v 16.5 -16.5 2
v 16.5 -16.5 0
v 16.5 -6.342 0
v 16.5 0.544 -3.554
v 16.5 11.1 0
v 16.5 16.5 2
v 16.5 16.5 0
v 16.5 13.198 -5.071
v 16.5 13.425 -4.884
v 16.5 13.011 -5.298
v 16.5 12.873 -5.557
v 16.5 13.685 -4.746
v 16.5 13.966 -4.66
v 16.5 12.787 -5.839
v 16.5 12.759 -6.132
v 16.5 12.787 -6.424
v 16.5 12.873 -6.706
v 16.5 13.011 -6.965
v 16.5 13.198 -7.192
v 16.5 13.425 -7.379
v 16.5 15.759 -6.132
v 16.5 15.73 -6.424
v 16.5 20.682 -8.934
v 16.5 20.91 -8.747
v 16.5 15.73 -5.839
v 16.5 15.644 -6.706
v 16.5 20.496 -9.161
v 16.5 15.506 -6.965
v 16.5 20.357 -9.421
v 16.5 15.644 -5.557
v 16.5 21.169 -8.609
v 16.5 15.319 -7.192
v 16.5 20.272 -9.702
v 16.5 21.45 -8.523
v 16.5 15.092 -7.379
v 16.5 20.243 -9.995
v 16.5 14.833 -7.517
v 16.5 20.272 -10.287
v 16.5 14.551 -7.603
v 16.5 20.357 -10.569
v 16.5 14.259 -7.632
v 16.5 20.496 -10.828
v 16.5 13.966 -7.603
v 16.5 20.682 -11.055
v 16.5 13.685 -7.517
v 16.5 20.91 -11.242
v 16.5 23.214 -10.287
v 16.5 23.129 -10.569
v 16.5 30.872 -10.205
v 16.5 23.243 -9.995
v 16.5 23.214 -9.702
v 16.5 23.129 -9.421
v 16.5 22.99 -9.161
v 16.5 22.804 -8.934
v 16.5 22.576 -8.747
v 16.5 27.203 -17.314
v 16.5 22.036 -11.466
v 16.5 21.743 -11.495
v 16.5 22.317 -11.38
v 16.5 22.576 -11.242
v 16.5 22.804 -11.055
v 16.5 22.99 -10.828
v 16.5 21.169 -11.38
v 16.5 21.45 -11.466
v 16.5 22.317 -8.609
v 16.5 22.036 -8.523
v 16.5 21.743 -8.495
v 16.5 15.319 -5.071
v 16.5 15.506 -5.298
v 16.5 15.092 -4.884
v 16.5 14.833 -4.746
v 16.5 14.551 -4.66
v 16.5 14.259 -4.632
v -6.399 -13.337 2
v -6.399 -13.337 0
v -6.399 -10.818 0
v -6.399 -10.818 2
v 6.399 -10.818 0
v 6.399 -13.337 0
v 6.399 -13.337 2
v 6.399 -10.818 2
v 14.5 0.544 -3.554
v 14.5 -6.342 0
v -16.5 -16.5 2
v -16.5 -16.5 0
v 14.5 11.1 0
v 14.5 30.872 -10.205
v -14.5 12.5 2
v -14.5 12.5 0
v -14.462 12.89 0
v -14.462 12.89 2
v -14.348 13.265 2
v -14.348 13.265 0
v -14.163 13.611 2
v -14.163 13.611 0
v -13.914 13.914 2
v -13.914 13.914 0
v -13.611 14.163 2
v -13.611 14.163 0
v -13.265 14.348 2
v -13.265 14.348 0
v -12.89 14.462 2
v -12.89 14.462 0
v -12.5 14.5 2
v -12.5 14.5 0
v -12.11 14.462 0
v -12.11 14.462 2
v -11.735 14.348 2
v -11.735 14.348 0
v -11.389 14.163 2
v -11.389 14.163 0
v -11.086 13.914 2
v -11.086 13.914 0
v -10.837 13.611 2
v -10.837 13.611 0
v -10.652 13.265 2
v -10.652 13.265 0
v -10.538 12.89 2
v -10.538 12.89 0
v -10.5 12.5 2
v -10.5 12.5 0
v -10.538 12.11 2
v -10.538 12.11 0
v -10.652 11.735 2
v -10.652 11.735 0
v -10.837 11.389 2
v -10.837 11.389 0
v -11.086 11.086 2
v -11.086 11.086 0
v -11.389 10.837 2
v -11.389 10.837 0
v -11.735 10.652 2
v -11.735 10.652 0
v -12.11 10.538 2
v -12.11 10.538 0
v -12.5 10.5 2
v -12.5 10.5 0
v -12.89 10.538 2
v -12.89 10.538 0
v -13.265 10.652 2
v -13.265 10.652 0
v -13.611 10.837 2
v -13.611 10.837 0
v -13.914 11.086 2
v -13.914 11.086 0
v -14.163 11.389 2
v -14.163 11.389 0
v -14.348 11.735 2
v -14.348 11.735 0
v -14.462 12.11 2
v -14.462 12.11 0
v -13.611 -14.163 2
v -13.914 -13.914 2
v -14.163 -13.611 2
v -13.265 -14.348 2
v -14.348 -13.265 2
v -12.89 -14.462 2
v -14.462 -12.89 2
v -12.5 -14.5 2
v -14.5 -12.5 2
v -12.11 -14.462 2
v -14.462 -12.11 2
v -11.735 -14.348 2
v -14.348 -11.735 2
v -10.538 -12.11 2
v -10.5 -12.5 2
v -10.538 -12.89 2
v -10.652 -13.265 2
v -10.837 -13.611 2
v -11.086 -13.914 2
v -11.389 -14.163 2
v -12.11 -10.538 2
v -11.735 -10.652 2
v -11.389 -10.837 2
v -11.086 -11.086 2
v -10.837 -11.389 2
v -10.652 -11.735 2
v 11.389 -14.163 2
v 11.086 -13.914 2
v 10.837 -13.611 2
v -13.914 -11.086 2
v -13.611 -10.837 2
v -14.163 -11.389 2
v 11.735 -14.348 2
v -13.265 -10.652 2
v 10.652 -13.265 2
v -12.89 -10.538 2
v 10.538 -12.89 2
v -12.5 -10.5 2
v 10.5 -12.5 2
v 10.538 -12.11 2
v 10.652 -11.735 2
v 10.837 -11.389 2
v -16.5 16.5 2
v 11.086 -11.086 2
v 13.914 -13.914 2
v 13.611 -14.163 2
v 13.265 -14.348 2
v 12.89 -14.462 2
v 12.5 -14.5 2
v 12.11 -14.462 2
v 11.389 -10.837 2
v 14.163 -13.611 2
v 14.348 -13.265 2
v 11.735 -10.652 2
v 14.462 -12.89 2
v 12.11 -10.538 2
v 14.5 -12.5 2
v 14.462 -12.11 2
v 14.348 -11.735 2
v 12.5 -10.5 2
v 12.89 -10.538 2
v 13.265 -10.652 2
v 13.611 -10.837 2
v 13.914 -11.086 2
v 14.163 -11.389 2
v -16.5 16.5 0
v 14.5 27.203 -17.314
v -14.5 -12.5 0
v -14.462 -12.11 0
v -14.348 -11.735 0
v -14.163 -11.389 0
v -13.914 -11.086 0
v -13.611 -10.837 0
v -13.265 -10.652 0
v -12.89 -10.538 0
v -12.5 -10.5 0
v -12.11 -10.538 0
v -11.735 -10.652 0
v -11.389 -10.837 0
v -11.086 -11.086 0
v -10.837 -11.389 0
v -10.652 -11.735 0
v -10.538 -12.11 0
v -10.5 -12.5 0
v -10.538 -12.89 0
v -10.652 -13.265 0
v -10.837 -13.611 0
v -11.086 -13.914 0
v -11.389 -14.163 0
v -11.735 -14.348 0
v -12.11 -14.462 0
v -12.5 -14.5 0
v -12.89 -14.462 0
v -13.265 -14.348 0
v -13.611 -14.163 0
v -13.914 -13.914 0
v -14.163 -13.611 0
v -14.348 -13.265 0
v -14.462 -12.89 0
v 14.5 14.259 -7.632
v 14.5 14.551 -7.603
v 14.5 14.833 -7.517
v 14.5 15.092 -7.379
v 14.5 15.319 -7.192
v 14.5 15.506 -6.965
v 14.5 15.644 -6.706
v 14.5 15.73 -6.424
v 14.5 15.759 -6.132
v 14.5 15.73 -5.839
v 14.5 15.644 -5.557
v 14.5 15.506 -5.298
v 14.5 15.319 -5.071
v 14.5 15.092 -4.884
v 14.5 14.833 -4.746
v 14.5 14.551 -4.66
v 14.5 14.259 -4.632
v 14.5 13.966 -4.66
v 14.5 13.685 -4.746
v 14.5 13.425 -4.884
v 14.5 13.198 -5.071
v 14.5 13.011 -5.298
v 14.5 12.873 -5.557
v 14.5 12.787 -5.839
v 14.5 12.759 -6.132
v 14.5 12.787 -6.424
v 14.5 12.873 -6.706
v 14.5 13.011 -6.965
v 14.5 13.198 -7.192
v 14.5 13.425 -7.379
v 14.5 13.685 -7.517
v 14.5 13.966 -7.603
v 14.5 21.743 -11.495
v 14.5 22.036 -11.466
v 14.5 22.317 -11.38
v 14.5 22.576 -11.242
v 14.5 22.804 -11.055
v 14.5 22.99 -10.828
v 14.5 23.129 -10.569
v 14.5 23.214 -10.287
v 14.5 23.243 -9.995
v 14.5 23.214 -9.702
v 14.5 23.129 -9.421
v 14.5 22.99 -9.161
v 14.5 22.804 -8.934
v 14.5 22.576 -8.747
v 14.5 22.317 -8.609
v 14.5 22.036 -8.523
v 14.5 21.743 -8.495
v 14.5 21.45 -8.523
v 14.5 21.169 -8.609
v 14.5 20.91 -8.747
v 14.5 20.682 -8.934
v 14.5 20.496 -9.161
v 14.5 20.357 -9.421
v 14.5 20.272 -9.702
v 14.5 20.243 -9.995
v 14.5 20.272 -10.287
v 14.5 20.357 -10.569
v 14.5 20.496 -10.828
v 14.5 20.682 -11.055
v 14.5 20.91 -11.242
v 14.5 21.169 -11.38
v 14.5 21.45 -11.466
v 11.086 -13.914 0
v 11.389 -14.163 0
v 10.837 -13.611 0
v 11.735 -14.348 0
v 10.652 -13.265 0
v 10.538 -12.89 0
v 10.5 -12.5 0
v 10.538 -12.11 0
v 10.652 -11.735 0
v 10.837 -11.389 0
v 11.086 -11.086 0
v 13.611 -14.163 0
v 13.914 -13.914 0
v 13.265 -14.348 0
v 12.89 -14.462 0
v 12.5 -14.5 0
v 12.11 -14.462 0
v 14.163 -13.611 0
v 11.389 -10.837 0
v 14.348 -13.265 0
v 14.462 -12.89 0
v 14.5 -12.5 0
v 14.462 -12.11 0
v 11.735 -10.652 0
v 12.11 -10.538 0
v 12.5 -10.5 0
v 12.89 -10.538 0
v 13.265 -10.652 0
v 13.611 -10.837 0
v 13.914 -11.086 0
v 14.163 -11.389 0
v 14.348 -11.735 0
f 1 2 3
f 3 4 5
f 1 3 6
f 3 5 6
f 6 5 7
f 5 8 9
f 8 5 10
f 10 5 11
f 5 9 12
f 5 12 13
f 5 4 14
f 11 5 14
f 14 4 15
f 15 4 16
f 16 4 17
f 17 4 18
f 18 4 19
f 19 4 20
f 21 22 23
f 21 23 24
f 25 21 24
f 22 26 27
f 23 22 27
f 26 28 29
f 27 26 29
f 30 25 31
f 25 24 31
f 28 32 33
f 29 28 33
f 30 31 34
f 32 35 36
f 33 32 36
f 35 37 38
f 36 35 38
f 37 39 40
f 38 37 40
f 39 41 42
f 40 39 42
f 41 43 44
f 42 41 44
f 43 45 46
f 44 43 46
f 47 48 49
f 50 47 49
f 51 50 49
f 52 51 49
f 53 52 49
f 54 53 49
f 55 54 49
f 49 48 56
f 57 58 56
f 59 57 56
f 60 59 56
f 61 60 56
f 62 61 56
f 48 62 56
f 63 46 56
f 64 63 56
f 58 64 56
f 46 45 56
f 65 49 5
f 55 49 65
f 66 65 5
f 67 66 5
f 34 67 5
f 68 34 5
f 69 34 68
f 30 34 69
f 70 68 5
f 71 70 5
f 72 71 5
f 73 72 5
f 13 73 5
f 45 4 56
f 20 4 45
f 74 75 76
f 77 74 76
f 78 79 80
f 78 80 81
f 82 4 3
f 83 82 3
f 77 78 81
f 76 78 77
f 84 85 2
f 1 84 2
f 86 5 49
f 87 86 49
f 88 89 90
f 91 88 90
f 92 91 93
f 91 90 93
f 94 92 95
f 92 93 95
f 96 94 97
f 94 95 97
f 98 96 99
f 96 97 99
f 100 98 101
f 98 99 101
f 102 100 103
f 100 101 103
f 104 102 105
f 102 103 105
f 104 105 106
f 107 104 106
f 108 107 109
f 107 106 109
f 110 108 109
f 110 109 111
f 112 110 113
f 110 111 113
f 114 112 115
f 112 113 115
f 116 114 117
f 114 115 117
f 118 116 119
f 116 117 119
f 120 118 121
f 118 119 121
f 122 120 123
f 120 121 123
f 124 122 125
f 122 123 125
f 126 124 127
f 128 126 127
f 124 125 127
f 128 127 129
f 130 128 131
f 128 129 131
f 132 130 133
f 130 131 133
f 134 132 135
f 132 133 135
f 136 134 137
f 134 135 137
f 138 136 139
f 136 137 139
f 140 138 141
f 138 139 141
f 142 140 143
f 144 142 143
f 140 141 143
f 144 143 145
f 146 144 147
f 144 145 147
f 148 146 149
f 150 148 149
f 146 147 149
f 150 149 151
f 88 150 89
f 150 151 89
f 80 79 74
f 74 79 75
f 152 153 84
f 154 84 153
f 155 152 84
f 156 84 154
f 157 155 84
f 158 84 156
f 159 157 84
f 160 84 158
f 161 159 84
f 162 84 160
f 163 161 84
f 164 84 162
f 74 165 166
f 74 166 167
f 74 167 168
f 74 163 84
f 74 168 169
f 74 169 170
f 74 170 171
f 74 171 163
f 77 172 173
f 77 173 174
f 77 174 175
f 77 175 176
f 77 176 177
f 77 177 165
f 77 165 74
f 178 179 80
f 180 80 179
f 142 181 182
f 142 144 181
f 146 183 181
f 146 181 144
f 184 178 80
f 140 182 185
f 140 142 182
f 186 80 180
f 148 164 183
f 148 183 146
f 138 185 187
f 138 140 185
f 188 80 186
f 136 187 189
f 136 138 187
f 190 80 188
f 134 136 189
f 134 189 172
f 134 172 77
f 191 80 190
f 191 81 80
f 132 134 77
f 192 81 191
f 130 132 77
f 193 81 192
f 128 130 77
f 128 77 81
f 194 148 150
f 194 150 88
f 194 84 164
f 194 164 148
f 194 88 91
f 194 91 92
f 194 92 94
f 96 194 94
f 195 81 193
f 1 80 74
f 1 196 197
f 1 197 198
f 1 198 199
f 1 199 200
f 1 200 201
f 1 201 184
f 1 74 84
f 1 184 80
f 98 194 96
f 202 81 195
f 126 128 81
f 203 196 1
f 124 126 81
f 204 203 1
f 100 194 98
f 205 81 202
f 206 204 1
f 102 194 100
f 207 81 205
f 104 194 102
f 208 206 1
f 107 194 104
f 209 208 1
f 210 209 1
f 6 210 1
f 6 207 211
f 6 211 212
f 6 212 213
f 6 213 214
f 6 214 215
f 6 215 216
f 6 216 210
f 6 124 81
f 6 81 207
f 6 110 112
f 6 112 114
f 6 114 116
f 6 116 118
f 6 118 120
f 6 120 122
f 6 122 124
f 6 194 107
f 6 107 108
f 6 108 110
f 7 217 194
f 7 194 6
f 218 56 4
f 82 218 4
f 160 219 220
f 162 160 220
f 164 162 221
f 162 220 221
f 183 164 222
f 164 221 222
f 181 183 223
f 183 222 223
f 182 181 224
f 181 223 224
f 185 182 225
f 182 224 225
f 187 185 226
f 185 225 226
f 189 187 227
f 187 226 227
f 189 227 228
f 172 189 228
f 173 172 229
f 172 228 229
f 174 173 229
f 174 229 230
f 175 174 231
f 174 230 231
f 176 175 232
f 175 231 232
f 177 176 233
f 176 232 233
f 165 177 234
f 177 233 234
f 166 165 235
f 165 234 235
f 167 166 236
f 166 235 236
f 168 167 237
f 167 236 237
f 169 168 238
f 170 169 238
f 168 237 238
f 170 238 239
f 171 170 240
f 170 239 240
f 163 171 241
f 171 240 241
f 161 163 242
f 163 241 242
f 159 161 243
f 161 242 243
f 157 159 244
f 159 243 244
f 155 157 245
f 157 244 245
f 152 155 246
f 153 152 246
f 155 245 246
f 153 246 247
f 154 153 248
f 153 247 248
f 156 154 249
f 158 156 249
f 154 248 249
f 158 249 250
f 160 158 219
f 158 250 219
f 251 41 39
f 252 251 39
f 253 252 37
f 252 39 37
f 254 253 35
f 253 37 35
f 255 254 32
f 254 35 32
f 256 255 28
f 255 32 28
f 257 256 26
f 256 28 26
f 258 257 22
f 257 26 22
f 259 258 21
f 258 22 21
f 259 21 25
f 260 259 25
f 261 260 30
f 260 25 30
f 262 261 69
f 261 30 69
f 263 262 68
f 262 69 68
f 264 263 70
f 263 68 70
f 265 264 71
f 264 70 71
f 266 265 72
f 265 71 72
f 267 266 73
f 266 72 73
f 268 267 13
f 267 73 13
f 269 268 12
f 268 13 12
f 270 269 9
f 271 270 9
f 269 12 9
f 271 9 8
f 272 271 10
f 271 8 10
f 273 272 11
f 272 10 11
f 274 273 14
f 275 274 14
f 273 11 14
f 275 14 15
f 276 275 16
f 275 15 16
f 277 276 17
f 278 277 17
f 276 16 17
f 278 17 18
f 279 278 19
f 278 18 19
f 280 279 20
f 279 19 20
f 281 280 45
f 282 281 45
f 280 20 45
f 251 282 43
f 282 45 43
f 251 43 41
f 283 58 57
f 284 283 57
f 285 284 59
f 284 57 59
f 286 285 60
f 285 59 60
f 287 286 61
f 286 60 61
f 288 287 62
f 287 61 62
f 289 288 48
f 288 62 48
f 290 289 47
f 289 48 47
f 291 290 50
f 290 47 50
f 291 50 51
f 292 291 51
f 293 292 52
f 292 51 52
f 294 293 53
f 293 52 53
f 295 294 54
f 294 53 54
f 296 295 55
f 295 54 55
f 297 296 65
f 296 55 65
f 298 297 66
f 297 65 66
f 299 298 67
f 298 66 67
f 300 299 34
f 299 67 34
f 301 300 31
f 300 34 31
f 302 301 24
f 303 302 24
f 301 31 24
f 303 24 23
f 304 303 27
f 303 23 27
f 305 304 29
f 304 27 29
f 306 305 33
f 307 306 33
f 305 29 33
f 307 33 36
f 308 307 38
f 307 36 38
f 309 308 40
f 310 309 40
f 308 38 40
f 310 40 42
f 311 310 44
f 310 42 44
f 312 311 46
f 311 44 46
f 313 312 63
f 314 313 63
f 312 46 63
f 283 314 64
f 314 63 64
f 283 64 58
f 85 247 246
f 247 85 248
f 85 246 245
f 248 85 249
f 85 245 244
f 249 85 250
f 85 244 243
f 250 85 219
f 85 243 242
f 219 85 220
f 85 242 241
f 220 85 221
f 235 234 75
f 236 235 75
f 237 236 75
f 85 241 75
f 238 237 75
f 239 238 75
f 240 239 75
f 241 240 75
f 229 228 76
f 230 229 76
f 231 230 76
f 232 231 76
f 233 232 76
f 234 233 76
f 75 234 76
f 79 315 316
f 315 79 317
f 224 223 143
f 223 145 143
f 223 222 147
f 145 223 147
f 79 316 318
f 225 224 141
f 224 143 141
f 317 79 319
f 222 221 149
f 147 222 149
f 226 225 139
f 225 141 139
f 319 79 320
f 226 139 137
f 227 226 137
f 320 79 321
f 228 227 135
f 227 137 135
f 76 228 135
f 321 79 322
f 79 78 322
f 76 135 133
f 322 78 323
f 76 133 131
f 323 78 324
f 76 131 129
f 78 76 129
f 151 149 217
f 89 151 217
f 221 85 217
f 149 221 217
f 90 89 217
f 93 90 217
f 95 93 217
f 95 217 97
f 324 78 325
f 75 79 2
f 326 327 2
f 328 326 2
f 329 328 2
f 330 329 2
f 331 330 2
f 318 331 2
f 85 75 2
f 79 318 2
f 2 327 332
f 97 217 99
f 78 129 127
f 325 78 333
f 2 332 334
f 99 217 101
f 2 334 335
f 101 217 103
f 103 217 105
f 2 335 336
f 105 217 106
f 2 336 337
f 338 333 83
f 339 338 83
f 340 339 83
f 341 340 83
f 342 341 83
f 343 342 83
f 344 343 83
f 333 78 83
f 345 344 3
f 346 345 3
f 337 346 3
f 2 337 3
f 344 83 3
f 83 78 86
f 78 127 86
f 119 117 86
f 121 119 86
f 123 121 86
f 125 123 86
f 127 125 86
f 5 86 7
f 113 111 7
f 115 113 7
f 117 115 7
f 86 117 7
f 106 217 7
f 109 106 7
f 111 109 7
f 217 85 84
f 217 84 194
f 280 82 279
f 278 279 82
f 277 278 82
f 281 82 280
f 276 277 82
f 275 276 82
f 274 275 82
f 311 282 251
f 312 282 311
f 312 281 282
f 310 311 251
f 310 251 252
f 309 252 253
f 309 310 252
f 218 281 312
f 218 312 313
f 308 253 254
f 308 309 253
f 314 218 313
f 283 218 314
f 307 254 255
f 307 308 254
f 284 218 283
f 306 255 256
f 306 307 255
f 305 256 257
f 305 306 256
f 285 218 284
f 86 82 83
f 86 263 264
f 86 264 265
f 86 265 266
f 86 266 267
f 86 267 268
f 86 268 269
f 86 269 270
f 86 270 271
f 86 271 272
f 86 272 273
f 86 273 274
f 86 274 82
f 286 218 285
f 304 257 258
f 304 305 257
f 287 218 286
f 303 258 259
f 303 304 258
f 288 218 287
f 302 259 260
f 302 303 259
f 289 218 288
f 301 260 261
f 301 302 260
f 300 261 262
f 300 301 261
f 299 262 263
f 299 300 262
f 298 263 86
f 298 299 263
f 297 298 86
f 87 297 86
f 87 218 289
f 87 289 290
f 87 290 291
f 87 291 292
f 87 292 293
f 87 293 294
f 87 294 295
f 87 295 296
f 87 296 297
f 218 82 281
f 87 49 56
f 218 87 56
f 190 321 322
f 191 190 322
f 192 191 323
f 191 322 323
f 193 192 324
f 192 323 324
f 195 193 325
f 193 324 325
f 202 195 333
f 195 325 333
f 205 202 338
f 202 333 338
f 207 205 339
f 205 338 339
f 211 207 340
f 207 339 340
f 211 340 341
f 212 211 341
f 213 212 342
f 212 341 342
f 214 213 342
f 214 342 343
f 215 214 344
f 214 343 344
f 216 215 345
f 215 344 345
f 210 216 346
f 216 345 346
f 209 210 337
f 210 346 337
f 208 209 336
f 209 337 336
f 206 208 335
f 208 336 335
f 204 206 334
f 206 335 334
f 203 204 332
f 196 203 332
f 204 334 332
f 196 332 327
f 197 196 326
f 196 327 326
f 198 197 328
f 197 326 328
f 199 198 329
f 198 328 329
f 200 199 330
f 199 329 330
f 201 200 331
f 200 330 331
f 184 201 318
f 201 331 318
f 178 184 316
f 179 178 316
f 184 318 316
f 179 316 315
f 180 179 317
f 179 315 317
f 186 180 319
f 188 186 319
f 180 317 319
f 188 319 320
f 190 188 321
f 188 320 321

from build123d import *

# Parameters (mm, degrees)
SKETCH2_W           = 33
SKETCH2_H           = 33
BOSS_EXTRUDE1_DEPTH = 2
BOSS_EXTRUDE2_DEPTH = 2
SKETCH4_R           = 1.5
CUT_EXTRUDE1_DEPTH  = 2
SKETCH5_R           = 2
SKETCH5_W           = 12.798144854
SKETCH5_H           = 2.519841992
CUT_EXTRUDE2_DEPTH  = 2


with BuildPart() as part:
    # Sketch2 → Boss-Extrude1 (new body)
    with BuildSketch(Plane.XY):
        Rectangle(SKETCH2_W, SKETCH2_H)
    extrude(amount=BOSS_EXTRUDE1_DEPTH)

    # Sketch3 → Boss-Extrude2 (add)
    with BuildSketch(Plane(origin=(16.5, 0, 0), x_dir=(0, 0, -1), z_dir=(1, 0, 0))):
        Polygon((3.554468931, 0.544368727), (0, -6.342288665), (0, 11.100222554), (10.205017704, 30.872082142), (17.313955565, 27.202885706), align=None)
    extrude(amount=-BOSS_EXTRUDE2_DEPTH)

    # Sketch4 → Cut-Extrude1 (cut)
    with BuildSketch(Plane(origin=(16.5, 0, 0), x_dir=(0, 0, -1), z_dir=(1, 0, 0))):
        with Locations((6.13151514, 14.258559898)):
            Circle(SKETCH4_R)
        with Locations((9.994536788, 21.743027229)):
            Circle(SKETCH4_R)
    extrude(amount=-CUT_EXTRUDE1_DEPTH, mode=Mode.SUBTRACT)

    # Sketch5 → Cut-Extrude2 (cut)
    with BuildSketch(Plane(origin=(0, 0, 0), x_dir=(-1, 0, 0), z_dir=(0, 0, -1))):
        with Locations((12.5, 12.5)):
            Circle(SKETCH5_R)
        with Locations((12.5, -12.5)):
            Circle(SKETCH5_R)
        with Locations((-12.5, -12.5)):
            Circle(SKETCH5_R)
        with Locations((0, -12.077487842)):
            Rectangle(SKETCH5_W, SKETCH5_H)
    extrude(amount=-CUT_EXTRUDE2_DEPTH, mode=Mode.SUBTRACT)


solid = part.part
